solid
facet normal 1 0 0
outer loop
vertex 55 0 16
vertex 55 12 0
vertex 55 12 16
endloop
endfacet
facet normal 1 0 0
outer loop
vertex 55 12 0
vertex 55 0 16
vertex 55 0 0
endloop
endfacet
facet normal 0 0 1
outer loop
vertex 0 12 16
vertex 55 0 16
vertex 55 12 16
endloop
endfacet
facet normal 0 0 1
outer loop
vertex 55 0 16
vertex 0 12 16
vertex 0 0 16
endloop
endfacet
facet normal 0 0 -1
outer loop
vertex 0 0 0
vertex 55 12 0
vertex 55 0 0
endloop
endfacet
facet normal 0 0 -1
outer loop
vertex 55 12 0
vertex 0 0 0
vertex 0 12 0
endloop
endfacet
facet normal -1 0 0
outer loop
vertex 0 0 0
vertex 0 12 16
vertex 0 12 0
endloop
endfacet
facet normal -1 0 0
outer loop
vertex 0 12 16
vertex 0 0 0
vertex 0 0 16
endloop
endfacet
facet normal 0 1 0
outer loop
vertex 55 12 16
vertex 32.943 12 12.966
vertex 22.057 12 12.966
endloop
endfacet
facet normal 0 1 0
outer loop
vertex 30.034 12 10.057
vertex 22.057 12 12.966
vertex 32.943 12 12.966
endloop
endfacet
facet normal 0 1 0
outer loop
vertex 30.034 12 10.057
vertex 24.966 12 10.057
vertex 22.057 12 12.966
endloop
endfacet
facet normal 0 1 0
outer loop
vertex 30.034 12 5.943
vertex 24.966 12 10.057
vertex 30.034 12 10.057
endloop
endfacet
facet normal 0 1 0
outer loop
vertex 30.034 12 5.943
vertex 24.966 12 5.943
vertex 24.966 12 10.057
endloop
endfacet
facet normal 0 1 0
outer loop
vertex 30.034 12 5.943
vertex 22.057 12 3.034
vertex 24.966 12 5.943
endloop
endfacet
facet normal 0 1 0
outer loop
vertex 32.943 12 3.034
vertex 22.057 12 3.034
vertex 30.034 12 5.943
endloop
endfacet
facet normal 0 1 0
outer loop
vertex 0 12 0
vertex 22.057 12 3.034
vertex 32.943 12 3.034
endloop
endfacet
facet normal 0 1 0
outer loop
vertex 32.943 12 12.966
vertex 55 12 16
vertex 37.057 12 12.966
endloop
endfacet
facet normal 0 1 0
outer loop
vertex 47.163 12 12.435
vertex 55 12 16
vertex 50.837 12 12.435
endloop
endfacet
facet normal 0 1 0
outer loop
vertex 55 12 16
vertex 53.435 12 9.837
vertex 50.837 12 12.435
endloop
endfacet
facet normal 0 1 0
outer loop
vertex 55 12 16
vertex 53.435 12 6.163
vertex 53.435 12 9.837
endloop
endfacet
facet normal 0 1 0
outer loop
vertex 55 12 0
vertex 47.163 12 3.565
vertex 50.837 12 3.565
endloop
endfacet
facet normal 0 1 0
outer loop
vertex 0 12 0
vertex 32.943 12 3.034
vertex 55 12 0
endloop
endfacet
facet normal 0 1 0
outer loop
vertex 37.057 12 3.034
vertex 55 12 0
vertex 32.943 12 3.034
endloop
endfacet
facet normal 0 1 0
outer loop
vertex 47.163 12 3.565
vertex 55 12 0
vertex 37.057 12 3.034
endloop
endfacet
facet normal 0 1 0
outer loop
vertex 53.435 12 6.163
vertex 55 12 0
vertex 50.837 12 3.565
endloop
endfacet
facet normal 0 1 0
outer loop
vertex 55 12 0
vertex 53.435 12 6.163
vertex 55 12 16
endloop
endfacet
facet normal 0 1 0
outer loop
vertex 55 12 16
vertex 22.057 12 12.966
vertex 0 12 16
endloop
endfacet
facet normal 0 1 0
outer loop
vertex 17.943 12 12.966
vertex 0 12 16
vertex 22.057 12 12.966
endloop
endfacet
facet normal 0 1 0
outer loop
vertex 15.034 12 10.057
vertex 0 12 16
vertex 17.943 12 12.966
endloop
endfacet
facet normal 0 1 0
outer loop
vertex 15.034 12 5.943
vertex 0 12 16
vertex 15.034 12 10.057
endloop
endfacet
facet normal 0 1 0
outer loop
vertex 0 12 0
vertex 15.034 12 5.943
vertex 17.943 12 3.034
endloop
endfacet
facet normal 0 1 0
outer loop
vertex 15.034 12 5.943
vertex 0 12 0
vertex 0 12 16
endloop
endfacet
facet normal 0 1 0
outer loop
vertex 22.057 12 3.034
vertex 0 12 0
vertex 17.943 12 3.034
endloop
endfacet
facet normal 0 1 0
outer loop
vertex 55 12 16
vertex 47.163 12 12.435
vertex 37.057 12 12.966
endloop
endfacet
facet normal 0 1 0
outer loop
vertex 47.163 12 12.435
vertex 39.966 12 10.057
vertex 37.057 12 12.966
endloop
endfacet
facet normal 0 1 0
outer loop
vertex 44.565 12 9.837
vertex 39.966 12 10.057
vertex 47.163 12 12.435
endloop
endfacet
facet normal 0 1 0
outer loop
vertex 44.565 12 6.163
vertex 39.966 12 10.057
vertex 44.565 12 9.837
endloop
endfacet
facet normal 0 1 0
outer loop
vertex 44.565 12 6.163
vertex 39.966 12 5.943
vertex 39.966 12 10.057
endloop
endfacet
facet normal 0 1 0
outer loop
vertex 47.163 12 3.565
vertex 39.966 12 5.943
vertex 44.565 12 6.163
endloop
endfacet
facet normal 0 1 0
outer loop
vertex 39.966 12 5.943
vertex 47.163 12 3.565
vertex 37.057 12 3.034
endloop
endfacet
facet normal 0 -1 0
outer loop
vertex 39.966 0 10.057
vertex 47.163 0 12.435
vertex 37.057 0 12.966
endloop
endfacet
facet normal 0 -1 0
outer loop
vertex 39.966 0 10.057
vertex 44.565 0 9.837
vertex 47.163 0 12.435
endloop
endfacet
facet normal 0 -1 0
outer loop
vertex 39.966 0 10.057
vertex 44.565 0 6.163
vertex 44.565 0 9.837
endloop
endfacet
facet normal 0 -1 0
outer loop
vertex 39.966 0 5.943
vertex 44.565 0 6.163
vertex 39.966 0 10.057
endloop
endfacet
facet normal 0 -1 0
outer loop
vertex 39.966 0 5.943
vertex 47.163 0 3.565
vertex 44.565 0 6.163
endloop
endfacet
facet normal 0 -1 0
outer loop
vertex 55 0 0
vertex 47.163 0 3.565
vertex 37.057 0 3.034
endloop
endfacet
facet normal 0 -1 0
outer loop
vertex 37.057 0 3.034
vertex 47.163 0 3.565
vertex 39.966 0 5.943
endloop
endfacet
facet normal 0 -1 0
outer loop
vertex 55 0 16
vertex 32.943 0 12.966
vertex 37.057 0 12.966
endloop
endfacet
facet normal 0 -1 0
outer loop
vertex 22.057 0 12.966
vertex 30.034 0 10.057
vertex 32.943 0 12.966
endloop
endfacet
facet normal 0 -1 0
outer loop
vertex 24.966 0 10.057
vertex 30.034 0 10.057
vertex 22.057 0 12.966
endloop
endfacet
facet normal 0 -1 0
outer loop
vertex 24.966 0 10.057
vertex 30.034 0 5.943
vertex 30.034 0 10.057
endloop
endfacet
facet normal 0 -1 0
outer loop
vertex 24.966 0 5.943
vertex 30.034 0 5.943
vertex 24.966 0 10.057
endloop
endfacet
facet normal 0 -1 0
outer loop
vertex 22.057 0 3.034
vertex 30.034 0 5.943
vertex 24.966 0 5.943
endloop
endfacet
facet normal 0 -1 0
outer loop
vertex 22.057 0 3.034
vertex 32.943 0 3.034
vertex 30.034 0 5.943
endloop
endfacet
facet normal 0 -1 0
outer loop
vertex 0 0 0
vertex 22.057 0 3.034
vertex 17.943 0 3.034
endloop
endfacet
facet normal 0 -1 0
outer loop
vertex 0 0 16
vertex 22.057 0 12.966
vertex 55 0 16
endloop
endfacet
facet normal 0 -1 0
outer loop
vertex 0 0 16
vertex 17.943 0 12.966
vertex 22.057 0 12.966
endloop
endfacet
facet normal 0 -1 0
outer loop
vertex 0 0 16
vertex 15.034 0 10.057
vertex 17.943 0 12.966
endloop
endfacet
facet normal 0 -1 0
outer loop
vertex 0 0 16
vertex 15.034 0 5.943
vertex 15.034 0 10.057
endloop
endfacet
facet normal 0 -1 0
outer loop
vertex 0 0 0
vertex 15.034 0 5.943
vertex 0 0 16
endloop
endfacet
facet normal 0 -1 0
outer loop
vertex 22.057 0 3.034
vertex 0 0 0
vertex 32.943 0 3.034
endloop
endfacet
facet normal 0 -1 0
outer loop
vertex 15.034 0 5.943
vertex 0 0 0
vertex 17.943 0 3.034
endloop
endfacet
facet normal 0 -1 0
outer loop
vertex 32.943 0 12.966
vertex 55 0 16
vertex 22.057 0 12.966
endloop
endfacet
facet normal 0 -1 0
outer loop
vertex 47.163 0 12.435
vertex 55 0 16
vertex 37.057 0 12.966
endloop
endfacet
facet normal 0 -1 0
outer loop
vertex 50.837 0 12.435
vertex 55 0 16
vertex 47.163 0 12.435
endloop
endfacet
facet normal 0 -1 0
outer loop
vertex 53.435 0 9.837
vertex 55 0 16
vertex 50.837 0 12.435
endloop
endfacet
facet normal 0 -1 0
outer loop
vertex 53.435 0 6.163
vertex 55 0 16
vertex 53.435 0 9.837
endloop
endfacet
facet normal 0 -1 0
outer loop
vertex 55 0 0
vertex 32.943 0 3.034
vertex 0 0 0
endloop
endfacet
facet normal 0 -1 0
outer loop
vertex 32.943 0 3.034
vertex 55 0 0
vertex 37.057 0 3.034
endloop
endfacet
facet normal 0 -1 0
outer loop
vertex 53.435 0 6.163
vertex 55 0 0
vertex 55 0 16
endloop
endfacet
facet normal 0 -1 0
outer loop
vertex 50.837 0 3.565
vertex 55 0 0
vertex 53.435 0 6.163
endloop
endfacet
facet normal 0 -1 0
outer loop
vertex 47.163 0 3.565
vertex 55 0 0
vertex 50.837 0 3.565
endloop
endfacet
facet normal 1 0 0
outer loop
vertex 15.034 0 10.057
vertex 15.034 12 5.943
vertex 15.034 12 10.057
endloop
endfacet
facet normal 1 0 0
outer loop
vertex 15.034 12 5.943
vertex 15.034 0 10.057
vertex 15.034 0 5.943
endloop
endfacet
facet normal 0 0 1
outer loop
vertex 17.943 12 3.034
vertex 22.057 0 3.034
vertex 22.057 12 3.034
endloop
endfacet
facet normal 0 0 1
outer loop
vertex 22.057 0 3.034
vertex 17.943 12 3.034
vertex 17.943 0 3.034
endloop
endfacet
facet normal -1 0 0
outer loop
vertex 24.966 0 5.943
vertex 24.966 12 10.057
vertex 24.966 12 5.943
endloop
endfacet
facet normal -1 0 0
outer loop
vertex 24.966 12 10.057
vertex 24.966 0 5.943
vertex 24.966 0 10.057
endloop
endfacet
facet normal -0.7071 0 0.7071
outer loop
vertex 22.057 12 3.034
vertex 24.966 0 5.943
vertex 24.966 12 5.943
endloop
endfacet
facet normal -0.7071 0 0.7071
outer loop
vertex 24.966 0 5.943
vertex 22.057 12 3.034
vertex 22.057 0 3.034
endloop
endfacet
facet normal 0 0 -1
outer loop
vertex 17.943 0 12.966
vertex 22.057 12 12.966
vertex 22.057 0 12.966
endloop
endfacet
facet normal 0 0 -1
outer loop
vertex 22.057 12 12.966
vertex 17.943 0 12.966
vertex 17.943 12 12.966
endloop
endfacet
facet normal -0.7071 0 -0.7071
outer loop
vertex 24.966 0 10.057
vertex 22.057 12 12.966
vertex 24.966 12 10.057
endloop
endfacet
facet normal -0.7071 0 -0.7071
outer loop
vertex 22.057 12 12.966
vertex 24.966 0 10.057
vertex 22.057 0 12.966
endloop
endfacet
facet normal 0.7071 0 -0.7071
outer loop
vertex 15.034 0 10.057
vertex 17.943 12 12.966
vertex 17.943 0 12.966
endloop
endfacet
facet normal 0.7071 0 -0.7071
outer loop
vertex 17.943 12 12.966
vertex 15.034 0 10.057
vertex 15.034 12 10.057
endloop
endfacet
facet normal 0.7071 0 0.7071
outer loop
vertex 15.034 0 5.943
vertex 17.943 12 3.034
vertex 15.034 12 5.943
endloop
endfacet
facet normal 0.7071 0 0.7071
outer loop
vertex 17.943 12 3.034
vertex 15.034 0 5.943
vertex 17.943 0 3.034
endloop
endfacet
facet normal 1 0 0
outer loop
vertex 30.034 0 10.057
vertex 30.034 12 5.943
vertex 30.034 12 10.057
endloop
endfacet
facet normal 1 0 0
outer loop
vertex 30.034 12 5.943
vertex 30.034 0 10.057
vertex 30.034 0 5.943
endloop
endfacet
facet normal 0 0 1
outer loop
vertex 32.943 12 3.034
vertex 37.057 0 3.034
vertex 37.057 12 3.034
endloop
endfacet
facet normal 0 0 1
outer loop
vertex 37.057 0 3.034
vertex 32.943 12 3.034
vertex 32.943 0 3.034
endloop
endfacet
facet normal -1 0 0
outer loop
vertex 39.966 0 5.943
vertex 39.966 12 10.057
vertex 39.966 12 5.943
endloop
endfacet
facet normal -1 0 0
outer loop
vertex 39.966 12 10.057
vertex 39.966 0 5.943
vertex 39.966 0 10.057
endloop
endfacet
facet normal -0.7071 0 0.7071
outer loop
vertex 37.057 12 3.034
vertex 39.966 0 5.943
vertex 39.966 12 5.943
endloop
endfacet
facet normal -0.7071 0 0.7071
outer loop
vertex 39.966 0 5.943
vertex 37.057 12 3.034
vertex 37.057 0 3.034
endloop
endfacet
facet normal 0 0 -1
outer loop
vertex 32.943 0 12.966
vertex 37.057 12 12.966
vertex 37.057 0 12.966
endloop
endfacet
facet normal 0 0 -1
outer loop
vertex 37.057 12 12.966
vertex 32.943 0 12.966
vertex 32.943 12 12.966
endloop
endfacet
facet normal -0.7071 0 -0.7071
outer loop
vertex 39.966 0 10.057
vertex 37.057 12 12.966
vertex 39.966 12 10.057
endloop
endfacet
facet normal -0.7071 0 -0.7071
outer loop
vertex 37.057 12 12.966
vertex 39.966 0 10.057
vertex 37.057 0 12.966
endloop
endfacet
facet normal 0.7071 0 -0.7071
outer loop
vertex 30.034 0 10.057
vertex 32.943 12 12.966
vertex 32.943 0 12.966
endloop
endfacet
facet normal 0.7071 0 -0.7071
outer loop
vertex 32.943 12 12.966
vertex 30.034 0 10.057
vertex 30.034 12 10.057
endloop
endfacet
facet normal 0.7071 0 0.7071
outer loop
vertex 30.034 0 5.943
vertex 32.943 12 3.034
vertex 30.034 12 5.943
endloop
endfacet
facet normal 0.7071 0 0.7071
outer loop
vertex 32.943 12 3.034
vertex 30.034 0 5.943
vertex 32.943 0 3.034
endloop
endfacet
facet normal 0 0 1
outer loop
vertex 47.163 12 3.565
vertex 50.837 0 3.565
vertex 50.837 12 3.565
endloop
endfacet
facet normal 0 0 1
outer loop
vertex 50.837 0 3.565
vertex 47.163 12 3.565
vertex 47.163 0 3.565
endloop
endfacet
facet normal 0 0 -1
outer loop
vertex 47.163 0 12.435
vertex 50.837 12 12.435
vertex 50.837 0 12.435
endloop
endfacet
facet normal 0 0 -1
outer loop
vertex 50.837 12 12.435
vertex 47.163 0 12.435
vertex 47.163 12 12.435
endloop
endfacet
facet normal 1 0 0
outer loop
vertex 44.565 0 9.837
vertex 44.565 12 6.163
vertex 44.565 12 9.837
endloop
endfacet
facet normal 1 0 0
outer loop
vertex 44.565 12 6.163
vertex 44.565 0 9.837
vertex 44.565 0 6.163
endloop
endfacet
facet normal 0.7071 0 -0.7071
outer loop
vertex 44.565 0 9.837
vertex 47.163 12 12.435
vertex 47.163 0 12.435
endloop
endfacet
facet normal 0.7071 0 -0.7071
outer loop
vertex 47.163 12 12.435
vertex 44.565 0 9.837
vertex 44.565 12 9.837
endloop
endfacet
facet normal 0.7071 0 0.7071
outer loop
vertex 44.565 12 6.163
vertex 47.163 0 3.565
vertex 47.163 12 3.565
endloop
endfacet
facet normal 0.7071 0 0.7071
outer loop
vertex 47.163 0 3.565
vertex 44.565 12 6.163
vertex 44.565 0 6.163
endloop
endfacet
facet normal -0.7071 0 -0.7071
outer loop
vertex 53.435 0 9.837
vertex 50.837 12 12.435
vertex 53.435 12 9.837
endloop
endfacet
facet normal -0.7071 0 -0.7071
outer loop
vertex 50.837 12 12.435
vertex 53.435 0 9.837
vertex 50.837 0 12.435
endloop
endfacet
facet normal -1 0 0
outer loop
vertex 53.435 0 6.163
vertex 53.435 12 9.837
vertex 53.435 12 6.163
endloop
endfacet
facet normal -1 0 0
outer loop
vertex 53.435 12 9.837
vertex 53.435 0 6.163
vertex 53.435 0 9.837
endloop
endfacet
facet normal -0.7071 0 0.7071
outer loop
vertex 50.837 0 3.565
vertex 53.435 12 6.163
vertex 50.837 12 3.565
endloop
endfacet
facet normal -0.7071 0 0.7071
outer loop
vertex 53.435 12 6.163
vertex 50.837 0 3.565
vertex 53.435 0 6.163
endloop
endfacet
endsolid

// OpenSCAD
use <MCAD/regular_shapes.scad>

module lg_hex() {
 rotate([90,22.5,0]) linear_extrude(24) {
     octagon(5.375);
 }
;   
}

module med_hex() {
  rotate([90,22.5,0]) linear_extrude(24) {
     octagon(4.8);
 }
;   
}

difference() {
//cube([120,12,16]);
cube([55,12,16]); //Tack Beam
translate([20,18,8]) lg_hex();
translate([35,18,8]) lg_hex();
translate([49,18,8]) med_hex();    
}
